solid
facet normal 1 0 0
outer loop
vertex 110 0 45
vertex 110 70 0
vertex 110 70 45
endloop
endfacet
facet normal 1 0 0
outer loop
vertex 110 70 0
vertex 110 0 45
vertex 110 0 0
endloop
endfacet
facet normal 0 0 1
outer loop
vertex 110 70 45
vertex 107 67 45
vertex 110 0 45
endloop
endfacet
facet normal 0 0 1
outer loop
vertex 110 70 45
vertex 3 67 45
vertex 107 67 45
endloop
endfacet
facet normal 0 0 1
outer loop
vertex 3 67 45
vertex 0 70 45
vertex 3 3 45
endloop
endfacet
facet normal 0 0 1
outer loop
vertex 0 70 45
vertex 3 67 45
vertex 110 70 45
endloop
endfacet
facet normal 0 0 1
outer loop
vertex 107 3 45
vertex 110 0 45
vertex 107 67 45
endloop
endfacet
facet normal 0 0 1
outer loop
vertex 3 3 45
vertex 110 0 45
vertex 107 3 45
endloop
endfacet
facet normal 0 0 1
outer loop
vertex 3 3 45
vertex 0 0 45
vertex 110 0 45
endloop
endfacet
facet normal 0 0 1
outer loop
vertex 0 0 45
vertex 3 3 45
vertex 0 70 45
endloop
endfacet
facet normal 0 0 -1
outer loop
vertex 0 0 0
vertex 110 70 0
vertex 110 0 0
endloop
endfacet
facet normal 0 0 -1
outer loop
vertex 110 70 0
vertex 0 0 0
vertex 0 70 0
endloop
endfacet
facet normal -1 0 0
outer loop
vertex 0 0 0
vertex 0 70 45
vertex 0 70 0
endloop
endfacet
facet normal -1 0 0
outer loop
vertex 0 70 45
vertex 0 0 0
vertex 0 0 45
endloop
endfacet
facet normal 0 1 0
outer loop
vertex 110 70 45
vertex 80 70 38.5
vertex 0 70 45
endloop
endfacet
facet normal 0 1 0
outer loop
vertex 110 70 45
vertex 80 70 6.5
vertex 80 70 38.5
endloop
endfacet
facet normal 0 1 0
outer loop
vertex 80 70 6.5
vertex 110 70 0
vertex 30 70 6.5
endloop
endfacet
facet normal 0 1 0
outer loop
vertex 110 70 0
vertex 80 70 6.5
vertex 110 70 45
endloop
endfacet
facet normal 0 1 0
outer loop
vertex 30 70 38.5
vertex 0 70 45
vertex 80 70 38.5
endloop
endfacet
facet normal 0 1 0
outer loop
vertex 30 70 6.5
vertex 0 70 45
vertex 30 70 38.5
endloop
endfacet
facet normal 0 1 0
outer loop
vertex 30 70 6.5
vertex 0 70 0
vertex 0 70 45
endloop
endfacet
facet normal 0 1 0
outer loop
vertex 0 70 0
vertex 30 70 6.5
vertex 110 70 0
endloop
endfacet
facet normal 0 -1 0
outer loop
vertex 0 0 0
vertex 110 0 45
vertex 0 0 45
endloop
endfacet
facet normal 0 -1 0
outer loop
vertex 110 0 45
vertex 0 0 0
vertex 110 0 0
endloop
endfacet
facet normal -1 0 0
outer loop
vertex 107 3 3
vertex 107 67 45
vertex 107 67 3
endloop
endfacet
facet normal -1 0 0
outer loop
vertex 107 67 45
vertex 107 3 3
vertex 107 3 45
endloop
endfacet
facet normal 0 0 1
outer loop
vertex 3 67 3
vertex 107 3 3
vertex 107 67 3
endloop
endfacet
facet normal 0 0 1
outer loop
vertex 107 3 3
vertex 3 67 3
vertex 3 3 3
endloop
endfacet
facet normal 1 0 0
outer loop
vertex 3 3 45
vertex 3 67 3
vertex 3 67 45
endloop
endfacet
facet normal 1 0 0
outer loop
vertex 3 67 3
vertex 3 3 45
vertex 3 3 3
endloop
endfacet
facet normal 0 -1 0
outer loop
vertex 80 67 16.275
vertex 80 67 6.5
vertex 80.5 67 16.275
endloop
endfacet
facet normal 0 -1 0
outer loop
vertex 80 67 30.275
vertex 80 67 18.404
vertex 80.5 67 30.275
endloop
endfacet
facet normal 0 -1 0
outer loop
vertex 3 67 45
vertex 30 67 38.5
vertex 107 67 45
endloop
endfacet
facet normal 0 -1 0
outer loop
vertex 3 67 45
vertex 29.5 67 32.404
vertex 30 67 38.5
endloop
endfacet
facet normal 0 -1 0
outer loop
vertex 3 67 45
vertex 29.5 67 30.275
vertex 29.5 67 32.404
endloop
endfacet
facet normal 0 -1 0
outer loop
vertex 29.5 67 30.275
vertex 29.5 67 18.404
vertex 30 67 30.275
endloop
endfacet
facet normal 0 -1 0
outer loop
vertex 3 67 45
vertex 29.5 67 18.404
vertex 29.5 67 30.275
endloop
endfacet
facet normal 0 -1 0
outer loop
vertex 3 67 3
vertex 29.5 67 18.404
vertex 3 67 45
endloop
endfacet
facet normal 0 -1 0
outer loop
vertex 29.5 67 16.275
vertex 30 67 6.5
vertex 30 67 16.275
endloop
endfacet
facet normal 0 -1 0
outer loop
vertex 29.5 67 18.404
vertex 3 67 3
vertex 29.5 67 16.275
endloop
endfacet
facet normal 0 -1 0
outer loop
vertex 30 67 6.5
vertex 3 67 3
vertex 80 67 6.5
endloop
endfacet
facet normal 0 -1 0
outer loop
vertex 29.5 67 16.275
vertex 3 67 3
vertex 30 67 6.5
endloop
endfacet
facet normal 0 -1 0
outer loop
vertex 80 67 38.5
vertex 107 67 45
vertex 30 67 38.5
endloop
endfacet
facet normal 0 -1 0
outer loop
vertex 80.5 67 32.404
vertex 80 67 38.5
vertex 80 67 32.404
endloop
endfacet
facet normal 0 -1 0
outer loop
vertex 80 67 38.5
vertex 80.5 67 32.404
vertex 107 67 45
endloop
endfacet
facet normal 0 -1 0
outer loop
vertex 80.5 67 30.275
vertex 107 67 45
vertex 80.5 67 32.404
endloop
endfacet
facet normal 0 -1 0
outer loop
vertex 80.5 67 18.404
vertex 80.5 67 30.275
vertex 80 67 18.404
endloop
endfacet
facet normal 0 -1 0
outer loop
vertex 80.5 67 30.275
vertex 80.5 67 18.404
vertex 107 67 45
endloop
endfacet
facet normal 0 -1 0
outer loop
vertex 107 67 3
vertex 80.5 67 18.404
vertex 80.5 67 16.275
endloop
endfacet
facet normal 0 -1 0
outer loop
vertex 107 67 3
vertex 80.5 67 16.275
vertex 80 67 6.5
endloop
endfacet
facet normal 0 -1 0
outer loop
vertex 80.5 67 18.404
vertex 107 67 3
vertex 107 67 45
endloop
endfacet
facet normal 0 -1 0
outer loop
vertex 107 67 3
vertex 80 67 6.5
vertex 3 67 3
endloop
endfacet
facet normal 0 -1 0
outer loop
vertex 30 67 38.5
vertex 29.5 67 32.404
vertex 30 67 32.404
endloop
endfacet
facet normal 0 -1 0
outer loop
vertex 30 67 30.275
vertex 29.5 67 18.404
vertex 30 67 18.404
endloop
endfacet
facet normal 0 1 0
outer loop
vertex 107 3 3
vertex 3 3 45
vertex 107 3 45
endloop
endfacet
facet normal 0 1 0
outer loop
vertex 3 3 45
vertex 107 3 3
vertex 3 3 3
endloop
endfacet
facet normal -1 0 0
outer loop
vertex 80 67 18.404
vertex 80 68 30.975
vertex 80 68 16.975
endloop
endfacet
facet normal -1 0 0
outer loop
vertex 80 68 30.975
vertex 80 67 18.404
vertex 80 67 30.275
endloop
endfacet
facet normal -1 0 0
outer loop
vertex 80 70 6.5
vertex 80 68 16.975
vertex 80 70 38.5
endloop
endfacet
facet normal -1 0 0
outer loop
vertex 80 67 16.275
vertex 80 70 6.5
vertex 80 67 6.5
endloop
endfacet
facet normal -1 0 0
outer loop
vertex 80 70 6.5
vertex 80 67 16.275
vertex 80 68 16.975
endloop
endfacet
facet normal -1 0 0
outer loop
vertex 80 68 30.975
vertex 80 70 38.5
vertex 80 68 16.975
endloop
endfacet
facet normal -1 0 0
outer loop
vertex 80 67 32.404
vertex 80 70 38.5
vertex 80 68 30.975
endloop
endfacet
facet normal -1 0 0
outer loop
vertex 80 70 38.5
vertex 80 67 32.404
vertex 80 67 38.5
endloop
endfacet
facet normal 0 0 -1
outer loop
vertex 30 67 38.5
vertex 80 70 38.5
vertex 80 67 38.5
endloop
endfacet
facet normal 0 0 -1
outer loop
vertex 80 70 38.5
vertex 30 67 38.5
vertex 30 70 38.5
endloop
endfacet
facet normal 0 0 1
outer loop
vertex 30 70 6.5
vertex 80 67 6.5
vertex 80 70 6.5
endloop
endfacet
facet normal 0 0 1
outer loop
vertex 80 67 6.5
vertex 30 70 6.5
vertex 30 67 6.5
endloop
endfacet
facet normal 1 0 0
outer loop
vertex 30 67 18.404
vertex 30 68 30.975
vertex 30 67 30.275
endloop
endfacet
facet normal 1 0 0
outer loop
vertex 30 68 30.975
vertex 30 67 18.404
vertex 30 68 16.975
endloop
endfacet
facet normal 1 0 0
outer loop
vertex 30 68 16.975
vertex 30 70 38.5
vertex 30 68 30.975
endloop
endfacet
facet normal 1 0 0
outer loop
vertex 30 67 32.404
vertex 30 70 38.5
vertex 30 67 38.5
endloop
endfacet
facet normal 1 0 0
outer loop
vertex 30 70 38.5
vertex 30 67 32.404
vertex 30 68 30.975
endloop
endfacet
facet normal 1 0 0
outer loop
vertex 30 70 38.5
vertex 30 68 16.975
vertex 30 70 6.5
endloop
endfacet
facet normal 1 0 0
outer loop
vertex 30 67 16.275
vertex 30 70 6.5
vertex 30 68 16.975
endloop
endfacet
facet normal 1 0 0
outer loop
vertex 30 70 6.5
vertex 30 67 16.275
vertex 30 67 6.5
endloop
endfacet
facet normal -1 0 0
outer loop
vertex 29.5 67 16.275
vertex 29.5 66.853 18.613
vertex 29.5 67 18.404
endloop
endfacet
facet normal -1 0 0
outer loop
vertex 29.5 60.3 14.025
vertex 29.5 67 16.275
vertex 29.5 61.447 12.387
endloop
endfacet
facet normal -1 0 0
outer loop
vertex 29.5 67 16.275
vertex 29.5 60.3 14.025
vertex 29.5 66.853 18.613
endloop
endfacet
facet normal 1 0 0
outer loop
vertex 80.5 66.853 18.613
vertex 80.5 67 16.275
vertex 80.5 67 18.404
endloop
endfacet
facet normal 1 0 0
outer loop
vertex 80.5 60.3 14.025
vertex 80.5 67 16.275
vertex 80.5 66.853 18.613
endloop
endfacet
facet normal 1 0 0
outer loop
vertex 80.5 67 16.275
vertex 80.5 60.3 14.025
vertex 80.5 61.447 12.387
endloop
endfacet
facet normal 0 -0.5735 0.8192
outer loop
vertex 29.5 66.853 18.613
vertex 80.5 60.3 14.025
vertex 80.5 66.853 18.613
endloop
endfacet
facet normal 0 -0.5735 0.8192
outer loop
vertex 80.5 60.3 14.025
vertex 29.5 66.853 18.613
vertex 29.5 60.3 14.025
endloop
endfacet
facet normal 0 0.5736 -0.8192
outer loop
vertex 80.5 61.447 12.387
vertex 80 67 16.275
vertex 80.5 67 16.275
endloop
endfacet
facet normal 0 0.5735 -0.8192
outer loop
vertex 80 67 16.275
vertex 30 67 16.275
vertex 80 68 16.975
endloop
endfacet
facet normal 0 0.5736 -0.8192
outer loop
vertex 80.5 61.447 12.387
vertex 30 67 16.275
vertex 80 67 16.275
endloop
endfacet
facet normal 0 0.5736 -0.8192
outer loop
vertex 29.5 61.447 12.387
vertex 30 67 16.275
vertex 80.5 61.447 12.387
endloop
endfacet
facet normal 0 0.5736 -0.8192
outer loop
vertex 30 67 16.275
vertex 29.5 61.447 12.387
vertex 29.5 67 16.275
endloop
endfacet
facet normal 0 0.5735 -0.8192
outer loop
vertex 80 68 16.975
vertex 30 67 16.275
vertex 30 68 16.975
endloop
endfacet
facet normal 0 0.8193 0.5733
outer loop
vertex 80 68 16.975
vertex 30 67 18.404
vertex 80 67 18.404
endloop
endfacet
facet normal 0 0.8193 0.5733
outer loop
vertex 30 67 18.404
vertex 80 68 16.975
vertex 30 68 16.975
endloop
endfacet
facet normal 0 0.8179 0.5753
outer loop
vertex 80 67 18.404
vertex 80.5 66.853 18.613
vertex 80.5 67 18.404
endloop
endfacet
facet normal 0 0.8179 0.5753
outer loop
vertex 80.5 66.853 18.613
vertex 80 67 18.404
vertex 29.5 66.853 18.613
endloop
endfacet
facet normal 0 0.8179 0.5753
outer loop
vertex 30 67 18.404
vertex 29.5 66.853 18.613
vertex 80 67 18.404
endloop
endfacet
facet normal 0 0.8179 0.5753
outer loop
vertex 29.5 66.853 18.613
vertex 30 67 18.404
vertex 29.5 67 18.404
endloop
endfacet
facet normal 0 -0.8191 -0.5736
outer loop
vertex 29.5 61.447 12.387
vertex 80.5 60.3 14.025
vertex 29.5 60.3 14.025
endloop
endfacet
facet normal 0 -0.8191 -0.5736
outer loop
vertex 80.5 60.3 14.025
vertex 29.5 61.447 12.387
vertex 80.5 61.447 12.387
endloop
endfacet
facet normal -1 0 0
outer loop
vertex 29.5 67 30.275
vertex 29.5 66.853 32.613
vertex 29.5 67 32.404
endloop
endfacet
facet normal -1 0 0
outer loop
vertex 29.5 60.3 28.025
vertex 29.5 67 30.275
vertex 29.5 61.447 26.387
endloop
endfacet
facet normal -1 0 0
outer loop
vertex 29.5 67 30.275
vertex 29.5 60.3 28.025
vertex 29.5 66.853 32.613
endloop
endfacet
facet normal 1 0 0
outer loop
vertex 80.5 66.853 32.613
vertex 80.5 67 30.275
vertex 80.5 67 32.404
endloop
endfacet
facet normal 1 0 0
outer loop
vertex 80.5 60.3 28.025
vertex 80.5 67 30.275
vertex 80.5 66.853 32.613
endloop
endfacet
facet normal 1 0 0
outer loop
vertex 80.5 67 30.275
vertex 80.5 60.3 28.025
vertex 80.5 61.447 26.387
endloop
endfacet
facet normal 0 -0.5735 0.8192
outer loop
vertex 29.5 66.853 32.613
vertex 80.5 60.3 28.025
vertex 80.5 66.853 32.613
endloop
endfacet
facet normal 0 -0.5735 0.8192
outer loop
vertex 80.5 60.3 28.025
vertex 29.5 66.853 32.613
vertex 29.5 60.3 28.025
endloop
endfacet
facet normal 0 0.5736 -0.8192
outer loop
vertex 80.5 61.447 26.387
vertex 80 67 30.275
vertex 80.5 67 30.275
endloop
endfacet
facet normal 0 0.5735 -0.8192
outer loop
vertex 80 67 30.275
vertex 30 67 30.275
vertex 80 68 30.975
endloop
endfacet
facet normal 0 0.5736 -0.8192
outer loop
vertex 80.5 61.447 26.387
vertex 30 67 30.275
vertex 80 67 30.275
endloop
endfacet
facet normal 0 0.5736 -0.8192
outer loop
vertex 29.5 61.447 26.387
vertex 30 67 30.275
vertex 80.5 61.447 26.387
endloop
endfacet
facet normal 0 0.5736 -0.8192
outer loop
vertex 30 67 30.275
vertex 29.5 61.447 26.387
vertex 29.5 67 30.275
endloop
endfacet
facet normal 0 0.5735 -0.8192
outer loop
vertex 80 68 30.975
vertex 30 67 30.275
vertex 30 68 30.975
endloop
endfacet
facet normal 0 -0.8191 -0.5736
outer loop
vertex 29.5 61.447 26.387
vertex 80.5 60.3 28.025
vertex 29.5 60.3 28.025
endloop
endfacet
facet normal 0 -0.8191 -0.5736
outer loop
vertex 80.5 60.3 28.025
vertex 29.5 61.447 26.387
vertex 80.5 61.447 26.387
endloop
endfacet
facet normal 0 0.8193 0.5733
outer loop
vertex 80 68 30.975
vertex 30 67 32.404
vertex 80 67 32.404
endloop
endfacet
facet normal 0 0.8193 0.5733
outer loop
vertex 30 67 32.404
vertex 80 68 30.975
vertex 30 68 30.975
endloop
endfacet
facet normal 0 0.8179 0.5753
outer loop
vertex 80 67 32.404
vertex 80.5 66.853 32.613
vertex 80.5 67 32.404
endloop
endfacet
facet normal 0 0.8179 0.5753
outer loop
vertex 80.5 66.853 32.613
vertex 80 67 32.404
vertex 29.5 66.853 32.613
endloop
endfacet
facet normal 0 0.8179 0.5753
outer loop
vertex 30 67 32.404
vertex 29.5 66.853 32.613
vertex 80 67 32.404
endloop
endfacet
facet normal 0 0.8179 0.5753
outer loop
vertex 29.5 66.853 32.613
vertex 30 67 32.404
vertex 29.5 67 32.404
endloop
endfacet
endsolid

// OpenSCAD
$fn = 32;

// ----------------------------------------------------------------------
// Vent box: louvers enclosure
// ----------------------------------------------------------------------

// --- parameters (mm) ---
box_l = 110;              // box length, X
box_w = 70;               // box width, Y
box_h = 45;               // box height, Z
wall_t = 3;               // shell wall thickness
win_l = 50;               // vent window width, X
win_h = 32;               // vent window height, Z
slat_t = 2;               // louver slat thickness
slat_d = 8;               // louver slat depth
slat_a = 35;              // louver slat angle, degrees
slat_pitch = 14;          // louver pitch
slat_yc = 64.15;          // slat centreline Y
fit_tol = 0.02;           // tolerance for press fits, mm
free_tol = 0.2;           // tolerance for clearance fits, mm

win_z0 = (box_h - win_h) / 2;  // window lower edge Z
n_slats = 2;  // louver count
slat_z0 = win_z0 + (win_h - (n_slats - 1) * slat_pitch) / 2;

difference() {
  union() {
    difference() {
      cube([box_l, box_w, box_h]);
  translate([wall_t, wall_t, wall_t])
    cube([box_l - 2 * wall_t, box_w - 2 * wall_t, box_h]);
  translate([(box_l - win_l) / 2, box_w - wall_t - 1, win_z0])
    cube([win_l, wall_t + 2, win_h]);
    }
    for (i = [0 : n_slats - 1])
      translate([box_l / 2, slat_yc, slat_z0 + i * slat_pitch])
        rotate([slat_a, 0, 0])
          cube([win_l + 1, slat_d, slat_t], center = true);
  }
}
